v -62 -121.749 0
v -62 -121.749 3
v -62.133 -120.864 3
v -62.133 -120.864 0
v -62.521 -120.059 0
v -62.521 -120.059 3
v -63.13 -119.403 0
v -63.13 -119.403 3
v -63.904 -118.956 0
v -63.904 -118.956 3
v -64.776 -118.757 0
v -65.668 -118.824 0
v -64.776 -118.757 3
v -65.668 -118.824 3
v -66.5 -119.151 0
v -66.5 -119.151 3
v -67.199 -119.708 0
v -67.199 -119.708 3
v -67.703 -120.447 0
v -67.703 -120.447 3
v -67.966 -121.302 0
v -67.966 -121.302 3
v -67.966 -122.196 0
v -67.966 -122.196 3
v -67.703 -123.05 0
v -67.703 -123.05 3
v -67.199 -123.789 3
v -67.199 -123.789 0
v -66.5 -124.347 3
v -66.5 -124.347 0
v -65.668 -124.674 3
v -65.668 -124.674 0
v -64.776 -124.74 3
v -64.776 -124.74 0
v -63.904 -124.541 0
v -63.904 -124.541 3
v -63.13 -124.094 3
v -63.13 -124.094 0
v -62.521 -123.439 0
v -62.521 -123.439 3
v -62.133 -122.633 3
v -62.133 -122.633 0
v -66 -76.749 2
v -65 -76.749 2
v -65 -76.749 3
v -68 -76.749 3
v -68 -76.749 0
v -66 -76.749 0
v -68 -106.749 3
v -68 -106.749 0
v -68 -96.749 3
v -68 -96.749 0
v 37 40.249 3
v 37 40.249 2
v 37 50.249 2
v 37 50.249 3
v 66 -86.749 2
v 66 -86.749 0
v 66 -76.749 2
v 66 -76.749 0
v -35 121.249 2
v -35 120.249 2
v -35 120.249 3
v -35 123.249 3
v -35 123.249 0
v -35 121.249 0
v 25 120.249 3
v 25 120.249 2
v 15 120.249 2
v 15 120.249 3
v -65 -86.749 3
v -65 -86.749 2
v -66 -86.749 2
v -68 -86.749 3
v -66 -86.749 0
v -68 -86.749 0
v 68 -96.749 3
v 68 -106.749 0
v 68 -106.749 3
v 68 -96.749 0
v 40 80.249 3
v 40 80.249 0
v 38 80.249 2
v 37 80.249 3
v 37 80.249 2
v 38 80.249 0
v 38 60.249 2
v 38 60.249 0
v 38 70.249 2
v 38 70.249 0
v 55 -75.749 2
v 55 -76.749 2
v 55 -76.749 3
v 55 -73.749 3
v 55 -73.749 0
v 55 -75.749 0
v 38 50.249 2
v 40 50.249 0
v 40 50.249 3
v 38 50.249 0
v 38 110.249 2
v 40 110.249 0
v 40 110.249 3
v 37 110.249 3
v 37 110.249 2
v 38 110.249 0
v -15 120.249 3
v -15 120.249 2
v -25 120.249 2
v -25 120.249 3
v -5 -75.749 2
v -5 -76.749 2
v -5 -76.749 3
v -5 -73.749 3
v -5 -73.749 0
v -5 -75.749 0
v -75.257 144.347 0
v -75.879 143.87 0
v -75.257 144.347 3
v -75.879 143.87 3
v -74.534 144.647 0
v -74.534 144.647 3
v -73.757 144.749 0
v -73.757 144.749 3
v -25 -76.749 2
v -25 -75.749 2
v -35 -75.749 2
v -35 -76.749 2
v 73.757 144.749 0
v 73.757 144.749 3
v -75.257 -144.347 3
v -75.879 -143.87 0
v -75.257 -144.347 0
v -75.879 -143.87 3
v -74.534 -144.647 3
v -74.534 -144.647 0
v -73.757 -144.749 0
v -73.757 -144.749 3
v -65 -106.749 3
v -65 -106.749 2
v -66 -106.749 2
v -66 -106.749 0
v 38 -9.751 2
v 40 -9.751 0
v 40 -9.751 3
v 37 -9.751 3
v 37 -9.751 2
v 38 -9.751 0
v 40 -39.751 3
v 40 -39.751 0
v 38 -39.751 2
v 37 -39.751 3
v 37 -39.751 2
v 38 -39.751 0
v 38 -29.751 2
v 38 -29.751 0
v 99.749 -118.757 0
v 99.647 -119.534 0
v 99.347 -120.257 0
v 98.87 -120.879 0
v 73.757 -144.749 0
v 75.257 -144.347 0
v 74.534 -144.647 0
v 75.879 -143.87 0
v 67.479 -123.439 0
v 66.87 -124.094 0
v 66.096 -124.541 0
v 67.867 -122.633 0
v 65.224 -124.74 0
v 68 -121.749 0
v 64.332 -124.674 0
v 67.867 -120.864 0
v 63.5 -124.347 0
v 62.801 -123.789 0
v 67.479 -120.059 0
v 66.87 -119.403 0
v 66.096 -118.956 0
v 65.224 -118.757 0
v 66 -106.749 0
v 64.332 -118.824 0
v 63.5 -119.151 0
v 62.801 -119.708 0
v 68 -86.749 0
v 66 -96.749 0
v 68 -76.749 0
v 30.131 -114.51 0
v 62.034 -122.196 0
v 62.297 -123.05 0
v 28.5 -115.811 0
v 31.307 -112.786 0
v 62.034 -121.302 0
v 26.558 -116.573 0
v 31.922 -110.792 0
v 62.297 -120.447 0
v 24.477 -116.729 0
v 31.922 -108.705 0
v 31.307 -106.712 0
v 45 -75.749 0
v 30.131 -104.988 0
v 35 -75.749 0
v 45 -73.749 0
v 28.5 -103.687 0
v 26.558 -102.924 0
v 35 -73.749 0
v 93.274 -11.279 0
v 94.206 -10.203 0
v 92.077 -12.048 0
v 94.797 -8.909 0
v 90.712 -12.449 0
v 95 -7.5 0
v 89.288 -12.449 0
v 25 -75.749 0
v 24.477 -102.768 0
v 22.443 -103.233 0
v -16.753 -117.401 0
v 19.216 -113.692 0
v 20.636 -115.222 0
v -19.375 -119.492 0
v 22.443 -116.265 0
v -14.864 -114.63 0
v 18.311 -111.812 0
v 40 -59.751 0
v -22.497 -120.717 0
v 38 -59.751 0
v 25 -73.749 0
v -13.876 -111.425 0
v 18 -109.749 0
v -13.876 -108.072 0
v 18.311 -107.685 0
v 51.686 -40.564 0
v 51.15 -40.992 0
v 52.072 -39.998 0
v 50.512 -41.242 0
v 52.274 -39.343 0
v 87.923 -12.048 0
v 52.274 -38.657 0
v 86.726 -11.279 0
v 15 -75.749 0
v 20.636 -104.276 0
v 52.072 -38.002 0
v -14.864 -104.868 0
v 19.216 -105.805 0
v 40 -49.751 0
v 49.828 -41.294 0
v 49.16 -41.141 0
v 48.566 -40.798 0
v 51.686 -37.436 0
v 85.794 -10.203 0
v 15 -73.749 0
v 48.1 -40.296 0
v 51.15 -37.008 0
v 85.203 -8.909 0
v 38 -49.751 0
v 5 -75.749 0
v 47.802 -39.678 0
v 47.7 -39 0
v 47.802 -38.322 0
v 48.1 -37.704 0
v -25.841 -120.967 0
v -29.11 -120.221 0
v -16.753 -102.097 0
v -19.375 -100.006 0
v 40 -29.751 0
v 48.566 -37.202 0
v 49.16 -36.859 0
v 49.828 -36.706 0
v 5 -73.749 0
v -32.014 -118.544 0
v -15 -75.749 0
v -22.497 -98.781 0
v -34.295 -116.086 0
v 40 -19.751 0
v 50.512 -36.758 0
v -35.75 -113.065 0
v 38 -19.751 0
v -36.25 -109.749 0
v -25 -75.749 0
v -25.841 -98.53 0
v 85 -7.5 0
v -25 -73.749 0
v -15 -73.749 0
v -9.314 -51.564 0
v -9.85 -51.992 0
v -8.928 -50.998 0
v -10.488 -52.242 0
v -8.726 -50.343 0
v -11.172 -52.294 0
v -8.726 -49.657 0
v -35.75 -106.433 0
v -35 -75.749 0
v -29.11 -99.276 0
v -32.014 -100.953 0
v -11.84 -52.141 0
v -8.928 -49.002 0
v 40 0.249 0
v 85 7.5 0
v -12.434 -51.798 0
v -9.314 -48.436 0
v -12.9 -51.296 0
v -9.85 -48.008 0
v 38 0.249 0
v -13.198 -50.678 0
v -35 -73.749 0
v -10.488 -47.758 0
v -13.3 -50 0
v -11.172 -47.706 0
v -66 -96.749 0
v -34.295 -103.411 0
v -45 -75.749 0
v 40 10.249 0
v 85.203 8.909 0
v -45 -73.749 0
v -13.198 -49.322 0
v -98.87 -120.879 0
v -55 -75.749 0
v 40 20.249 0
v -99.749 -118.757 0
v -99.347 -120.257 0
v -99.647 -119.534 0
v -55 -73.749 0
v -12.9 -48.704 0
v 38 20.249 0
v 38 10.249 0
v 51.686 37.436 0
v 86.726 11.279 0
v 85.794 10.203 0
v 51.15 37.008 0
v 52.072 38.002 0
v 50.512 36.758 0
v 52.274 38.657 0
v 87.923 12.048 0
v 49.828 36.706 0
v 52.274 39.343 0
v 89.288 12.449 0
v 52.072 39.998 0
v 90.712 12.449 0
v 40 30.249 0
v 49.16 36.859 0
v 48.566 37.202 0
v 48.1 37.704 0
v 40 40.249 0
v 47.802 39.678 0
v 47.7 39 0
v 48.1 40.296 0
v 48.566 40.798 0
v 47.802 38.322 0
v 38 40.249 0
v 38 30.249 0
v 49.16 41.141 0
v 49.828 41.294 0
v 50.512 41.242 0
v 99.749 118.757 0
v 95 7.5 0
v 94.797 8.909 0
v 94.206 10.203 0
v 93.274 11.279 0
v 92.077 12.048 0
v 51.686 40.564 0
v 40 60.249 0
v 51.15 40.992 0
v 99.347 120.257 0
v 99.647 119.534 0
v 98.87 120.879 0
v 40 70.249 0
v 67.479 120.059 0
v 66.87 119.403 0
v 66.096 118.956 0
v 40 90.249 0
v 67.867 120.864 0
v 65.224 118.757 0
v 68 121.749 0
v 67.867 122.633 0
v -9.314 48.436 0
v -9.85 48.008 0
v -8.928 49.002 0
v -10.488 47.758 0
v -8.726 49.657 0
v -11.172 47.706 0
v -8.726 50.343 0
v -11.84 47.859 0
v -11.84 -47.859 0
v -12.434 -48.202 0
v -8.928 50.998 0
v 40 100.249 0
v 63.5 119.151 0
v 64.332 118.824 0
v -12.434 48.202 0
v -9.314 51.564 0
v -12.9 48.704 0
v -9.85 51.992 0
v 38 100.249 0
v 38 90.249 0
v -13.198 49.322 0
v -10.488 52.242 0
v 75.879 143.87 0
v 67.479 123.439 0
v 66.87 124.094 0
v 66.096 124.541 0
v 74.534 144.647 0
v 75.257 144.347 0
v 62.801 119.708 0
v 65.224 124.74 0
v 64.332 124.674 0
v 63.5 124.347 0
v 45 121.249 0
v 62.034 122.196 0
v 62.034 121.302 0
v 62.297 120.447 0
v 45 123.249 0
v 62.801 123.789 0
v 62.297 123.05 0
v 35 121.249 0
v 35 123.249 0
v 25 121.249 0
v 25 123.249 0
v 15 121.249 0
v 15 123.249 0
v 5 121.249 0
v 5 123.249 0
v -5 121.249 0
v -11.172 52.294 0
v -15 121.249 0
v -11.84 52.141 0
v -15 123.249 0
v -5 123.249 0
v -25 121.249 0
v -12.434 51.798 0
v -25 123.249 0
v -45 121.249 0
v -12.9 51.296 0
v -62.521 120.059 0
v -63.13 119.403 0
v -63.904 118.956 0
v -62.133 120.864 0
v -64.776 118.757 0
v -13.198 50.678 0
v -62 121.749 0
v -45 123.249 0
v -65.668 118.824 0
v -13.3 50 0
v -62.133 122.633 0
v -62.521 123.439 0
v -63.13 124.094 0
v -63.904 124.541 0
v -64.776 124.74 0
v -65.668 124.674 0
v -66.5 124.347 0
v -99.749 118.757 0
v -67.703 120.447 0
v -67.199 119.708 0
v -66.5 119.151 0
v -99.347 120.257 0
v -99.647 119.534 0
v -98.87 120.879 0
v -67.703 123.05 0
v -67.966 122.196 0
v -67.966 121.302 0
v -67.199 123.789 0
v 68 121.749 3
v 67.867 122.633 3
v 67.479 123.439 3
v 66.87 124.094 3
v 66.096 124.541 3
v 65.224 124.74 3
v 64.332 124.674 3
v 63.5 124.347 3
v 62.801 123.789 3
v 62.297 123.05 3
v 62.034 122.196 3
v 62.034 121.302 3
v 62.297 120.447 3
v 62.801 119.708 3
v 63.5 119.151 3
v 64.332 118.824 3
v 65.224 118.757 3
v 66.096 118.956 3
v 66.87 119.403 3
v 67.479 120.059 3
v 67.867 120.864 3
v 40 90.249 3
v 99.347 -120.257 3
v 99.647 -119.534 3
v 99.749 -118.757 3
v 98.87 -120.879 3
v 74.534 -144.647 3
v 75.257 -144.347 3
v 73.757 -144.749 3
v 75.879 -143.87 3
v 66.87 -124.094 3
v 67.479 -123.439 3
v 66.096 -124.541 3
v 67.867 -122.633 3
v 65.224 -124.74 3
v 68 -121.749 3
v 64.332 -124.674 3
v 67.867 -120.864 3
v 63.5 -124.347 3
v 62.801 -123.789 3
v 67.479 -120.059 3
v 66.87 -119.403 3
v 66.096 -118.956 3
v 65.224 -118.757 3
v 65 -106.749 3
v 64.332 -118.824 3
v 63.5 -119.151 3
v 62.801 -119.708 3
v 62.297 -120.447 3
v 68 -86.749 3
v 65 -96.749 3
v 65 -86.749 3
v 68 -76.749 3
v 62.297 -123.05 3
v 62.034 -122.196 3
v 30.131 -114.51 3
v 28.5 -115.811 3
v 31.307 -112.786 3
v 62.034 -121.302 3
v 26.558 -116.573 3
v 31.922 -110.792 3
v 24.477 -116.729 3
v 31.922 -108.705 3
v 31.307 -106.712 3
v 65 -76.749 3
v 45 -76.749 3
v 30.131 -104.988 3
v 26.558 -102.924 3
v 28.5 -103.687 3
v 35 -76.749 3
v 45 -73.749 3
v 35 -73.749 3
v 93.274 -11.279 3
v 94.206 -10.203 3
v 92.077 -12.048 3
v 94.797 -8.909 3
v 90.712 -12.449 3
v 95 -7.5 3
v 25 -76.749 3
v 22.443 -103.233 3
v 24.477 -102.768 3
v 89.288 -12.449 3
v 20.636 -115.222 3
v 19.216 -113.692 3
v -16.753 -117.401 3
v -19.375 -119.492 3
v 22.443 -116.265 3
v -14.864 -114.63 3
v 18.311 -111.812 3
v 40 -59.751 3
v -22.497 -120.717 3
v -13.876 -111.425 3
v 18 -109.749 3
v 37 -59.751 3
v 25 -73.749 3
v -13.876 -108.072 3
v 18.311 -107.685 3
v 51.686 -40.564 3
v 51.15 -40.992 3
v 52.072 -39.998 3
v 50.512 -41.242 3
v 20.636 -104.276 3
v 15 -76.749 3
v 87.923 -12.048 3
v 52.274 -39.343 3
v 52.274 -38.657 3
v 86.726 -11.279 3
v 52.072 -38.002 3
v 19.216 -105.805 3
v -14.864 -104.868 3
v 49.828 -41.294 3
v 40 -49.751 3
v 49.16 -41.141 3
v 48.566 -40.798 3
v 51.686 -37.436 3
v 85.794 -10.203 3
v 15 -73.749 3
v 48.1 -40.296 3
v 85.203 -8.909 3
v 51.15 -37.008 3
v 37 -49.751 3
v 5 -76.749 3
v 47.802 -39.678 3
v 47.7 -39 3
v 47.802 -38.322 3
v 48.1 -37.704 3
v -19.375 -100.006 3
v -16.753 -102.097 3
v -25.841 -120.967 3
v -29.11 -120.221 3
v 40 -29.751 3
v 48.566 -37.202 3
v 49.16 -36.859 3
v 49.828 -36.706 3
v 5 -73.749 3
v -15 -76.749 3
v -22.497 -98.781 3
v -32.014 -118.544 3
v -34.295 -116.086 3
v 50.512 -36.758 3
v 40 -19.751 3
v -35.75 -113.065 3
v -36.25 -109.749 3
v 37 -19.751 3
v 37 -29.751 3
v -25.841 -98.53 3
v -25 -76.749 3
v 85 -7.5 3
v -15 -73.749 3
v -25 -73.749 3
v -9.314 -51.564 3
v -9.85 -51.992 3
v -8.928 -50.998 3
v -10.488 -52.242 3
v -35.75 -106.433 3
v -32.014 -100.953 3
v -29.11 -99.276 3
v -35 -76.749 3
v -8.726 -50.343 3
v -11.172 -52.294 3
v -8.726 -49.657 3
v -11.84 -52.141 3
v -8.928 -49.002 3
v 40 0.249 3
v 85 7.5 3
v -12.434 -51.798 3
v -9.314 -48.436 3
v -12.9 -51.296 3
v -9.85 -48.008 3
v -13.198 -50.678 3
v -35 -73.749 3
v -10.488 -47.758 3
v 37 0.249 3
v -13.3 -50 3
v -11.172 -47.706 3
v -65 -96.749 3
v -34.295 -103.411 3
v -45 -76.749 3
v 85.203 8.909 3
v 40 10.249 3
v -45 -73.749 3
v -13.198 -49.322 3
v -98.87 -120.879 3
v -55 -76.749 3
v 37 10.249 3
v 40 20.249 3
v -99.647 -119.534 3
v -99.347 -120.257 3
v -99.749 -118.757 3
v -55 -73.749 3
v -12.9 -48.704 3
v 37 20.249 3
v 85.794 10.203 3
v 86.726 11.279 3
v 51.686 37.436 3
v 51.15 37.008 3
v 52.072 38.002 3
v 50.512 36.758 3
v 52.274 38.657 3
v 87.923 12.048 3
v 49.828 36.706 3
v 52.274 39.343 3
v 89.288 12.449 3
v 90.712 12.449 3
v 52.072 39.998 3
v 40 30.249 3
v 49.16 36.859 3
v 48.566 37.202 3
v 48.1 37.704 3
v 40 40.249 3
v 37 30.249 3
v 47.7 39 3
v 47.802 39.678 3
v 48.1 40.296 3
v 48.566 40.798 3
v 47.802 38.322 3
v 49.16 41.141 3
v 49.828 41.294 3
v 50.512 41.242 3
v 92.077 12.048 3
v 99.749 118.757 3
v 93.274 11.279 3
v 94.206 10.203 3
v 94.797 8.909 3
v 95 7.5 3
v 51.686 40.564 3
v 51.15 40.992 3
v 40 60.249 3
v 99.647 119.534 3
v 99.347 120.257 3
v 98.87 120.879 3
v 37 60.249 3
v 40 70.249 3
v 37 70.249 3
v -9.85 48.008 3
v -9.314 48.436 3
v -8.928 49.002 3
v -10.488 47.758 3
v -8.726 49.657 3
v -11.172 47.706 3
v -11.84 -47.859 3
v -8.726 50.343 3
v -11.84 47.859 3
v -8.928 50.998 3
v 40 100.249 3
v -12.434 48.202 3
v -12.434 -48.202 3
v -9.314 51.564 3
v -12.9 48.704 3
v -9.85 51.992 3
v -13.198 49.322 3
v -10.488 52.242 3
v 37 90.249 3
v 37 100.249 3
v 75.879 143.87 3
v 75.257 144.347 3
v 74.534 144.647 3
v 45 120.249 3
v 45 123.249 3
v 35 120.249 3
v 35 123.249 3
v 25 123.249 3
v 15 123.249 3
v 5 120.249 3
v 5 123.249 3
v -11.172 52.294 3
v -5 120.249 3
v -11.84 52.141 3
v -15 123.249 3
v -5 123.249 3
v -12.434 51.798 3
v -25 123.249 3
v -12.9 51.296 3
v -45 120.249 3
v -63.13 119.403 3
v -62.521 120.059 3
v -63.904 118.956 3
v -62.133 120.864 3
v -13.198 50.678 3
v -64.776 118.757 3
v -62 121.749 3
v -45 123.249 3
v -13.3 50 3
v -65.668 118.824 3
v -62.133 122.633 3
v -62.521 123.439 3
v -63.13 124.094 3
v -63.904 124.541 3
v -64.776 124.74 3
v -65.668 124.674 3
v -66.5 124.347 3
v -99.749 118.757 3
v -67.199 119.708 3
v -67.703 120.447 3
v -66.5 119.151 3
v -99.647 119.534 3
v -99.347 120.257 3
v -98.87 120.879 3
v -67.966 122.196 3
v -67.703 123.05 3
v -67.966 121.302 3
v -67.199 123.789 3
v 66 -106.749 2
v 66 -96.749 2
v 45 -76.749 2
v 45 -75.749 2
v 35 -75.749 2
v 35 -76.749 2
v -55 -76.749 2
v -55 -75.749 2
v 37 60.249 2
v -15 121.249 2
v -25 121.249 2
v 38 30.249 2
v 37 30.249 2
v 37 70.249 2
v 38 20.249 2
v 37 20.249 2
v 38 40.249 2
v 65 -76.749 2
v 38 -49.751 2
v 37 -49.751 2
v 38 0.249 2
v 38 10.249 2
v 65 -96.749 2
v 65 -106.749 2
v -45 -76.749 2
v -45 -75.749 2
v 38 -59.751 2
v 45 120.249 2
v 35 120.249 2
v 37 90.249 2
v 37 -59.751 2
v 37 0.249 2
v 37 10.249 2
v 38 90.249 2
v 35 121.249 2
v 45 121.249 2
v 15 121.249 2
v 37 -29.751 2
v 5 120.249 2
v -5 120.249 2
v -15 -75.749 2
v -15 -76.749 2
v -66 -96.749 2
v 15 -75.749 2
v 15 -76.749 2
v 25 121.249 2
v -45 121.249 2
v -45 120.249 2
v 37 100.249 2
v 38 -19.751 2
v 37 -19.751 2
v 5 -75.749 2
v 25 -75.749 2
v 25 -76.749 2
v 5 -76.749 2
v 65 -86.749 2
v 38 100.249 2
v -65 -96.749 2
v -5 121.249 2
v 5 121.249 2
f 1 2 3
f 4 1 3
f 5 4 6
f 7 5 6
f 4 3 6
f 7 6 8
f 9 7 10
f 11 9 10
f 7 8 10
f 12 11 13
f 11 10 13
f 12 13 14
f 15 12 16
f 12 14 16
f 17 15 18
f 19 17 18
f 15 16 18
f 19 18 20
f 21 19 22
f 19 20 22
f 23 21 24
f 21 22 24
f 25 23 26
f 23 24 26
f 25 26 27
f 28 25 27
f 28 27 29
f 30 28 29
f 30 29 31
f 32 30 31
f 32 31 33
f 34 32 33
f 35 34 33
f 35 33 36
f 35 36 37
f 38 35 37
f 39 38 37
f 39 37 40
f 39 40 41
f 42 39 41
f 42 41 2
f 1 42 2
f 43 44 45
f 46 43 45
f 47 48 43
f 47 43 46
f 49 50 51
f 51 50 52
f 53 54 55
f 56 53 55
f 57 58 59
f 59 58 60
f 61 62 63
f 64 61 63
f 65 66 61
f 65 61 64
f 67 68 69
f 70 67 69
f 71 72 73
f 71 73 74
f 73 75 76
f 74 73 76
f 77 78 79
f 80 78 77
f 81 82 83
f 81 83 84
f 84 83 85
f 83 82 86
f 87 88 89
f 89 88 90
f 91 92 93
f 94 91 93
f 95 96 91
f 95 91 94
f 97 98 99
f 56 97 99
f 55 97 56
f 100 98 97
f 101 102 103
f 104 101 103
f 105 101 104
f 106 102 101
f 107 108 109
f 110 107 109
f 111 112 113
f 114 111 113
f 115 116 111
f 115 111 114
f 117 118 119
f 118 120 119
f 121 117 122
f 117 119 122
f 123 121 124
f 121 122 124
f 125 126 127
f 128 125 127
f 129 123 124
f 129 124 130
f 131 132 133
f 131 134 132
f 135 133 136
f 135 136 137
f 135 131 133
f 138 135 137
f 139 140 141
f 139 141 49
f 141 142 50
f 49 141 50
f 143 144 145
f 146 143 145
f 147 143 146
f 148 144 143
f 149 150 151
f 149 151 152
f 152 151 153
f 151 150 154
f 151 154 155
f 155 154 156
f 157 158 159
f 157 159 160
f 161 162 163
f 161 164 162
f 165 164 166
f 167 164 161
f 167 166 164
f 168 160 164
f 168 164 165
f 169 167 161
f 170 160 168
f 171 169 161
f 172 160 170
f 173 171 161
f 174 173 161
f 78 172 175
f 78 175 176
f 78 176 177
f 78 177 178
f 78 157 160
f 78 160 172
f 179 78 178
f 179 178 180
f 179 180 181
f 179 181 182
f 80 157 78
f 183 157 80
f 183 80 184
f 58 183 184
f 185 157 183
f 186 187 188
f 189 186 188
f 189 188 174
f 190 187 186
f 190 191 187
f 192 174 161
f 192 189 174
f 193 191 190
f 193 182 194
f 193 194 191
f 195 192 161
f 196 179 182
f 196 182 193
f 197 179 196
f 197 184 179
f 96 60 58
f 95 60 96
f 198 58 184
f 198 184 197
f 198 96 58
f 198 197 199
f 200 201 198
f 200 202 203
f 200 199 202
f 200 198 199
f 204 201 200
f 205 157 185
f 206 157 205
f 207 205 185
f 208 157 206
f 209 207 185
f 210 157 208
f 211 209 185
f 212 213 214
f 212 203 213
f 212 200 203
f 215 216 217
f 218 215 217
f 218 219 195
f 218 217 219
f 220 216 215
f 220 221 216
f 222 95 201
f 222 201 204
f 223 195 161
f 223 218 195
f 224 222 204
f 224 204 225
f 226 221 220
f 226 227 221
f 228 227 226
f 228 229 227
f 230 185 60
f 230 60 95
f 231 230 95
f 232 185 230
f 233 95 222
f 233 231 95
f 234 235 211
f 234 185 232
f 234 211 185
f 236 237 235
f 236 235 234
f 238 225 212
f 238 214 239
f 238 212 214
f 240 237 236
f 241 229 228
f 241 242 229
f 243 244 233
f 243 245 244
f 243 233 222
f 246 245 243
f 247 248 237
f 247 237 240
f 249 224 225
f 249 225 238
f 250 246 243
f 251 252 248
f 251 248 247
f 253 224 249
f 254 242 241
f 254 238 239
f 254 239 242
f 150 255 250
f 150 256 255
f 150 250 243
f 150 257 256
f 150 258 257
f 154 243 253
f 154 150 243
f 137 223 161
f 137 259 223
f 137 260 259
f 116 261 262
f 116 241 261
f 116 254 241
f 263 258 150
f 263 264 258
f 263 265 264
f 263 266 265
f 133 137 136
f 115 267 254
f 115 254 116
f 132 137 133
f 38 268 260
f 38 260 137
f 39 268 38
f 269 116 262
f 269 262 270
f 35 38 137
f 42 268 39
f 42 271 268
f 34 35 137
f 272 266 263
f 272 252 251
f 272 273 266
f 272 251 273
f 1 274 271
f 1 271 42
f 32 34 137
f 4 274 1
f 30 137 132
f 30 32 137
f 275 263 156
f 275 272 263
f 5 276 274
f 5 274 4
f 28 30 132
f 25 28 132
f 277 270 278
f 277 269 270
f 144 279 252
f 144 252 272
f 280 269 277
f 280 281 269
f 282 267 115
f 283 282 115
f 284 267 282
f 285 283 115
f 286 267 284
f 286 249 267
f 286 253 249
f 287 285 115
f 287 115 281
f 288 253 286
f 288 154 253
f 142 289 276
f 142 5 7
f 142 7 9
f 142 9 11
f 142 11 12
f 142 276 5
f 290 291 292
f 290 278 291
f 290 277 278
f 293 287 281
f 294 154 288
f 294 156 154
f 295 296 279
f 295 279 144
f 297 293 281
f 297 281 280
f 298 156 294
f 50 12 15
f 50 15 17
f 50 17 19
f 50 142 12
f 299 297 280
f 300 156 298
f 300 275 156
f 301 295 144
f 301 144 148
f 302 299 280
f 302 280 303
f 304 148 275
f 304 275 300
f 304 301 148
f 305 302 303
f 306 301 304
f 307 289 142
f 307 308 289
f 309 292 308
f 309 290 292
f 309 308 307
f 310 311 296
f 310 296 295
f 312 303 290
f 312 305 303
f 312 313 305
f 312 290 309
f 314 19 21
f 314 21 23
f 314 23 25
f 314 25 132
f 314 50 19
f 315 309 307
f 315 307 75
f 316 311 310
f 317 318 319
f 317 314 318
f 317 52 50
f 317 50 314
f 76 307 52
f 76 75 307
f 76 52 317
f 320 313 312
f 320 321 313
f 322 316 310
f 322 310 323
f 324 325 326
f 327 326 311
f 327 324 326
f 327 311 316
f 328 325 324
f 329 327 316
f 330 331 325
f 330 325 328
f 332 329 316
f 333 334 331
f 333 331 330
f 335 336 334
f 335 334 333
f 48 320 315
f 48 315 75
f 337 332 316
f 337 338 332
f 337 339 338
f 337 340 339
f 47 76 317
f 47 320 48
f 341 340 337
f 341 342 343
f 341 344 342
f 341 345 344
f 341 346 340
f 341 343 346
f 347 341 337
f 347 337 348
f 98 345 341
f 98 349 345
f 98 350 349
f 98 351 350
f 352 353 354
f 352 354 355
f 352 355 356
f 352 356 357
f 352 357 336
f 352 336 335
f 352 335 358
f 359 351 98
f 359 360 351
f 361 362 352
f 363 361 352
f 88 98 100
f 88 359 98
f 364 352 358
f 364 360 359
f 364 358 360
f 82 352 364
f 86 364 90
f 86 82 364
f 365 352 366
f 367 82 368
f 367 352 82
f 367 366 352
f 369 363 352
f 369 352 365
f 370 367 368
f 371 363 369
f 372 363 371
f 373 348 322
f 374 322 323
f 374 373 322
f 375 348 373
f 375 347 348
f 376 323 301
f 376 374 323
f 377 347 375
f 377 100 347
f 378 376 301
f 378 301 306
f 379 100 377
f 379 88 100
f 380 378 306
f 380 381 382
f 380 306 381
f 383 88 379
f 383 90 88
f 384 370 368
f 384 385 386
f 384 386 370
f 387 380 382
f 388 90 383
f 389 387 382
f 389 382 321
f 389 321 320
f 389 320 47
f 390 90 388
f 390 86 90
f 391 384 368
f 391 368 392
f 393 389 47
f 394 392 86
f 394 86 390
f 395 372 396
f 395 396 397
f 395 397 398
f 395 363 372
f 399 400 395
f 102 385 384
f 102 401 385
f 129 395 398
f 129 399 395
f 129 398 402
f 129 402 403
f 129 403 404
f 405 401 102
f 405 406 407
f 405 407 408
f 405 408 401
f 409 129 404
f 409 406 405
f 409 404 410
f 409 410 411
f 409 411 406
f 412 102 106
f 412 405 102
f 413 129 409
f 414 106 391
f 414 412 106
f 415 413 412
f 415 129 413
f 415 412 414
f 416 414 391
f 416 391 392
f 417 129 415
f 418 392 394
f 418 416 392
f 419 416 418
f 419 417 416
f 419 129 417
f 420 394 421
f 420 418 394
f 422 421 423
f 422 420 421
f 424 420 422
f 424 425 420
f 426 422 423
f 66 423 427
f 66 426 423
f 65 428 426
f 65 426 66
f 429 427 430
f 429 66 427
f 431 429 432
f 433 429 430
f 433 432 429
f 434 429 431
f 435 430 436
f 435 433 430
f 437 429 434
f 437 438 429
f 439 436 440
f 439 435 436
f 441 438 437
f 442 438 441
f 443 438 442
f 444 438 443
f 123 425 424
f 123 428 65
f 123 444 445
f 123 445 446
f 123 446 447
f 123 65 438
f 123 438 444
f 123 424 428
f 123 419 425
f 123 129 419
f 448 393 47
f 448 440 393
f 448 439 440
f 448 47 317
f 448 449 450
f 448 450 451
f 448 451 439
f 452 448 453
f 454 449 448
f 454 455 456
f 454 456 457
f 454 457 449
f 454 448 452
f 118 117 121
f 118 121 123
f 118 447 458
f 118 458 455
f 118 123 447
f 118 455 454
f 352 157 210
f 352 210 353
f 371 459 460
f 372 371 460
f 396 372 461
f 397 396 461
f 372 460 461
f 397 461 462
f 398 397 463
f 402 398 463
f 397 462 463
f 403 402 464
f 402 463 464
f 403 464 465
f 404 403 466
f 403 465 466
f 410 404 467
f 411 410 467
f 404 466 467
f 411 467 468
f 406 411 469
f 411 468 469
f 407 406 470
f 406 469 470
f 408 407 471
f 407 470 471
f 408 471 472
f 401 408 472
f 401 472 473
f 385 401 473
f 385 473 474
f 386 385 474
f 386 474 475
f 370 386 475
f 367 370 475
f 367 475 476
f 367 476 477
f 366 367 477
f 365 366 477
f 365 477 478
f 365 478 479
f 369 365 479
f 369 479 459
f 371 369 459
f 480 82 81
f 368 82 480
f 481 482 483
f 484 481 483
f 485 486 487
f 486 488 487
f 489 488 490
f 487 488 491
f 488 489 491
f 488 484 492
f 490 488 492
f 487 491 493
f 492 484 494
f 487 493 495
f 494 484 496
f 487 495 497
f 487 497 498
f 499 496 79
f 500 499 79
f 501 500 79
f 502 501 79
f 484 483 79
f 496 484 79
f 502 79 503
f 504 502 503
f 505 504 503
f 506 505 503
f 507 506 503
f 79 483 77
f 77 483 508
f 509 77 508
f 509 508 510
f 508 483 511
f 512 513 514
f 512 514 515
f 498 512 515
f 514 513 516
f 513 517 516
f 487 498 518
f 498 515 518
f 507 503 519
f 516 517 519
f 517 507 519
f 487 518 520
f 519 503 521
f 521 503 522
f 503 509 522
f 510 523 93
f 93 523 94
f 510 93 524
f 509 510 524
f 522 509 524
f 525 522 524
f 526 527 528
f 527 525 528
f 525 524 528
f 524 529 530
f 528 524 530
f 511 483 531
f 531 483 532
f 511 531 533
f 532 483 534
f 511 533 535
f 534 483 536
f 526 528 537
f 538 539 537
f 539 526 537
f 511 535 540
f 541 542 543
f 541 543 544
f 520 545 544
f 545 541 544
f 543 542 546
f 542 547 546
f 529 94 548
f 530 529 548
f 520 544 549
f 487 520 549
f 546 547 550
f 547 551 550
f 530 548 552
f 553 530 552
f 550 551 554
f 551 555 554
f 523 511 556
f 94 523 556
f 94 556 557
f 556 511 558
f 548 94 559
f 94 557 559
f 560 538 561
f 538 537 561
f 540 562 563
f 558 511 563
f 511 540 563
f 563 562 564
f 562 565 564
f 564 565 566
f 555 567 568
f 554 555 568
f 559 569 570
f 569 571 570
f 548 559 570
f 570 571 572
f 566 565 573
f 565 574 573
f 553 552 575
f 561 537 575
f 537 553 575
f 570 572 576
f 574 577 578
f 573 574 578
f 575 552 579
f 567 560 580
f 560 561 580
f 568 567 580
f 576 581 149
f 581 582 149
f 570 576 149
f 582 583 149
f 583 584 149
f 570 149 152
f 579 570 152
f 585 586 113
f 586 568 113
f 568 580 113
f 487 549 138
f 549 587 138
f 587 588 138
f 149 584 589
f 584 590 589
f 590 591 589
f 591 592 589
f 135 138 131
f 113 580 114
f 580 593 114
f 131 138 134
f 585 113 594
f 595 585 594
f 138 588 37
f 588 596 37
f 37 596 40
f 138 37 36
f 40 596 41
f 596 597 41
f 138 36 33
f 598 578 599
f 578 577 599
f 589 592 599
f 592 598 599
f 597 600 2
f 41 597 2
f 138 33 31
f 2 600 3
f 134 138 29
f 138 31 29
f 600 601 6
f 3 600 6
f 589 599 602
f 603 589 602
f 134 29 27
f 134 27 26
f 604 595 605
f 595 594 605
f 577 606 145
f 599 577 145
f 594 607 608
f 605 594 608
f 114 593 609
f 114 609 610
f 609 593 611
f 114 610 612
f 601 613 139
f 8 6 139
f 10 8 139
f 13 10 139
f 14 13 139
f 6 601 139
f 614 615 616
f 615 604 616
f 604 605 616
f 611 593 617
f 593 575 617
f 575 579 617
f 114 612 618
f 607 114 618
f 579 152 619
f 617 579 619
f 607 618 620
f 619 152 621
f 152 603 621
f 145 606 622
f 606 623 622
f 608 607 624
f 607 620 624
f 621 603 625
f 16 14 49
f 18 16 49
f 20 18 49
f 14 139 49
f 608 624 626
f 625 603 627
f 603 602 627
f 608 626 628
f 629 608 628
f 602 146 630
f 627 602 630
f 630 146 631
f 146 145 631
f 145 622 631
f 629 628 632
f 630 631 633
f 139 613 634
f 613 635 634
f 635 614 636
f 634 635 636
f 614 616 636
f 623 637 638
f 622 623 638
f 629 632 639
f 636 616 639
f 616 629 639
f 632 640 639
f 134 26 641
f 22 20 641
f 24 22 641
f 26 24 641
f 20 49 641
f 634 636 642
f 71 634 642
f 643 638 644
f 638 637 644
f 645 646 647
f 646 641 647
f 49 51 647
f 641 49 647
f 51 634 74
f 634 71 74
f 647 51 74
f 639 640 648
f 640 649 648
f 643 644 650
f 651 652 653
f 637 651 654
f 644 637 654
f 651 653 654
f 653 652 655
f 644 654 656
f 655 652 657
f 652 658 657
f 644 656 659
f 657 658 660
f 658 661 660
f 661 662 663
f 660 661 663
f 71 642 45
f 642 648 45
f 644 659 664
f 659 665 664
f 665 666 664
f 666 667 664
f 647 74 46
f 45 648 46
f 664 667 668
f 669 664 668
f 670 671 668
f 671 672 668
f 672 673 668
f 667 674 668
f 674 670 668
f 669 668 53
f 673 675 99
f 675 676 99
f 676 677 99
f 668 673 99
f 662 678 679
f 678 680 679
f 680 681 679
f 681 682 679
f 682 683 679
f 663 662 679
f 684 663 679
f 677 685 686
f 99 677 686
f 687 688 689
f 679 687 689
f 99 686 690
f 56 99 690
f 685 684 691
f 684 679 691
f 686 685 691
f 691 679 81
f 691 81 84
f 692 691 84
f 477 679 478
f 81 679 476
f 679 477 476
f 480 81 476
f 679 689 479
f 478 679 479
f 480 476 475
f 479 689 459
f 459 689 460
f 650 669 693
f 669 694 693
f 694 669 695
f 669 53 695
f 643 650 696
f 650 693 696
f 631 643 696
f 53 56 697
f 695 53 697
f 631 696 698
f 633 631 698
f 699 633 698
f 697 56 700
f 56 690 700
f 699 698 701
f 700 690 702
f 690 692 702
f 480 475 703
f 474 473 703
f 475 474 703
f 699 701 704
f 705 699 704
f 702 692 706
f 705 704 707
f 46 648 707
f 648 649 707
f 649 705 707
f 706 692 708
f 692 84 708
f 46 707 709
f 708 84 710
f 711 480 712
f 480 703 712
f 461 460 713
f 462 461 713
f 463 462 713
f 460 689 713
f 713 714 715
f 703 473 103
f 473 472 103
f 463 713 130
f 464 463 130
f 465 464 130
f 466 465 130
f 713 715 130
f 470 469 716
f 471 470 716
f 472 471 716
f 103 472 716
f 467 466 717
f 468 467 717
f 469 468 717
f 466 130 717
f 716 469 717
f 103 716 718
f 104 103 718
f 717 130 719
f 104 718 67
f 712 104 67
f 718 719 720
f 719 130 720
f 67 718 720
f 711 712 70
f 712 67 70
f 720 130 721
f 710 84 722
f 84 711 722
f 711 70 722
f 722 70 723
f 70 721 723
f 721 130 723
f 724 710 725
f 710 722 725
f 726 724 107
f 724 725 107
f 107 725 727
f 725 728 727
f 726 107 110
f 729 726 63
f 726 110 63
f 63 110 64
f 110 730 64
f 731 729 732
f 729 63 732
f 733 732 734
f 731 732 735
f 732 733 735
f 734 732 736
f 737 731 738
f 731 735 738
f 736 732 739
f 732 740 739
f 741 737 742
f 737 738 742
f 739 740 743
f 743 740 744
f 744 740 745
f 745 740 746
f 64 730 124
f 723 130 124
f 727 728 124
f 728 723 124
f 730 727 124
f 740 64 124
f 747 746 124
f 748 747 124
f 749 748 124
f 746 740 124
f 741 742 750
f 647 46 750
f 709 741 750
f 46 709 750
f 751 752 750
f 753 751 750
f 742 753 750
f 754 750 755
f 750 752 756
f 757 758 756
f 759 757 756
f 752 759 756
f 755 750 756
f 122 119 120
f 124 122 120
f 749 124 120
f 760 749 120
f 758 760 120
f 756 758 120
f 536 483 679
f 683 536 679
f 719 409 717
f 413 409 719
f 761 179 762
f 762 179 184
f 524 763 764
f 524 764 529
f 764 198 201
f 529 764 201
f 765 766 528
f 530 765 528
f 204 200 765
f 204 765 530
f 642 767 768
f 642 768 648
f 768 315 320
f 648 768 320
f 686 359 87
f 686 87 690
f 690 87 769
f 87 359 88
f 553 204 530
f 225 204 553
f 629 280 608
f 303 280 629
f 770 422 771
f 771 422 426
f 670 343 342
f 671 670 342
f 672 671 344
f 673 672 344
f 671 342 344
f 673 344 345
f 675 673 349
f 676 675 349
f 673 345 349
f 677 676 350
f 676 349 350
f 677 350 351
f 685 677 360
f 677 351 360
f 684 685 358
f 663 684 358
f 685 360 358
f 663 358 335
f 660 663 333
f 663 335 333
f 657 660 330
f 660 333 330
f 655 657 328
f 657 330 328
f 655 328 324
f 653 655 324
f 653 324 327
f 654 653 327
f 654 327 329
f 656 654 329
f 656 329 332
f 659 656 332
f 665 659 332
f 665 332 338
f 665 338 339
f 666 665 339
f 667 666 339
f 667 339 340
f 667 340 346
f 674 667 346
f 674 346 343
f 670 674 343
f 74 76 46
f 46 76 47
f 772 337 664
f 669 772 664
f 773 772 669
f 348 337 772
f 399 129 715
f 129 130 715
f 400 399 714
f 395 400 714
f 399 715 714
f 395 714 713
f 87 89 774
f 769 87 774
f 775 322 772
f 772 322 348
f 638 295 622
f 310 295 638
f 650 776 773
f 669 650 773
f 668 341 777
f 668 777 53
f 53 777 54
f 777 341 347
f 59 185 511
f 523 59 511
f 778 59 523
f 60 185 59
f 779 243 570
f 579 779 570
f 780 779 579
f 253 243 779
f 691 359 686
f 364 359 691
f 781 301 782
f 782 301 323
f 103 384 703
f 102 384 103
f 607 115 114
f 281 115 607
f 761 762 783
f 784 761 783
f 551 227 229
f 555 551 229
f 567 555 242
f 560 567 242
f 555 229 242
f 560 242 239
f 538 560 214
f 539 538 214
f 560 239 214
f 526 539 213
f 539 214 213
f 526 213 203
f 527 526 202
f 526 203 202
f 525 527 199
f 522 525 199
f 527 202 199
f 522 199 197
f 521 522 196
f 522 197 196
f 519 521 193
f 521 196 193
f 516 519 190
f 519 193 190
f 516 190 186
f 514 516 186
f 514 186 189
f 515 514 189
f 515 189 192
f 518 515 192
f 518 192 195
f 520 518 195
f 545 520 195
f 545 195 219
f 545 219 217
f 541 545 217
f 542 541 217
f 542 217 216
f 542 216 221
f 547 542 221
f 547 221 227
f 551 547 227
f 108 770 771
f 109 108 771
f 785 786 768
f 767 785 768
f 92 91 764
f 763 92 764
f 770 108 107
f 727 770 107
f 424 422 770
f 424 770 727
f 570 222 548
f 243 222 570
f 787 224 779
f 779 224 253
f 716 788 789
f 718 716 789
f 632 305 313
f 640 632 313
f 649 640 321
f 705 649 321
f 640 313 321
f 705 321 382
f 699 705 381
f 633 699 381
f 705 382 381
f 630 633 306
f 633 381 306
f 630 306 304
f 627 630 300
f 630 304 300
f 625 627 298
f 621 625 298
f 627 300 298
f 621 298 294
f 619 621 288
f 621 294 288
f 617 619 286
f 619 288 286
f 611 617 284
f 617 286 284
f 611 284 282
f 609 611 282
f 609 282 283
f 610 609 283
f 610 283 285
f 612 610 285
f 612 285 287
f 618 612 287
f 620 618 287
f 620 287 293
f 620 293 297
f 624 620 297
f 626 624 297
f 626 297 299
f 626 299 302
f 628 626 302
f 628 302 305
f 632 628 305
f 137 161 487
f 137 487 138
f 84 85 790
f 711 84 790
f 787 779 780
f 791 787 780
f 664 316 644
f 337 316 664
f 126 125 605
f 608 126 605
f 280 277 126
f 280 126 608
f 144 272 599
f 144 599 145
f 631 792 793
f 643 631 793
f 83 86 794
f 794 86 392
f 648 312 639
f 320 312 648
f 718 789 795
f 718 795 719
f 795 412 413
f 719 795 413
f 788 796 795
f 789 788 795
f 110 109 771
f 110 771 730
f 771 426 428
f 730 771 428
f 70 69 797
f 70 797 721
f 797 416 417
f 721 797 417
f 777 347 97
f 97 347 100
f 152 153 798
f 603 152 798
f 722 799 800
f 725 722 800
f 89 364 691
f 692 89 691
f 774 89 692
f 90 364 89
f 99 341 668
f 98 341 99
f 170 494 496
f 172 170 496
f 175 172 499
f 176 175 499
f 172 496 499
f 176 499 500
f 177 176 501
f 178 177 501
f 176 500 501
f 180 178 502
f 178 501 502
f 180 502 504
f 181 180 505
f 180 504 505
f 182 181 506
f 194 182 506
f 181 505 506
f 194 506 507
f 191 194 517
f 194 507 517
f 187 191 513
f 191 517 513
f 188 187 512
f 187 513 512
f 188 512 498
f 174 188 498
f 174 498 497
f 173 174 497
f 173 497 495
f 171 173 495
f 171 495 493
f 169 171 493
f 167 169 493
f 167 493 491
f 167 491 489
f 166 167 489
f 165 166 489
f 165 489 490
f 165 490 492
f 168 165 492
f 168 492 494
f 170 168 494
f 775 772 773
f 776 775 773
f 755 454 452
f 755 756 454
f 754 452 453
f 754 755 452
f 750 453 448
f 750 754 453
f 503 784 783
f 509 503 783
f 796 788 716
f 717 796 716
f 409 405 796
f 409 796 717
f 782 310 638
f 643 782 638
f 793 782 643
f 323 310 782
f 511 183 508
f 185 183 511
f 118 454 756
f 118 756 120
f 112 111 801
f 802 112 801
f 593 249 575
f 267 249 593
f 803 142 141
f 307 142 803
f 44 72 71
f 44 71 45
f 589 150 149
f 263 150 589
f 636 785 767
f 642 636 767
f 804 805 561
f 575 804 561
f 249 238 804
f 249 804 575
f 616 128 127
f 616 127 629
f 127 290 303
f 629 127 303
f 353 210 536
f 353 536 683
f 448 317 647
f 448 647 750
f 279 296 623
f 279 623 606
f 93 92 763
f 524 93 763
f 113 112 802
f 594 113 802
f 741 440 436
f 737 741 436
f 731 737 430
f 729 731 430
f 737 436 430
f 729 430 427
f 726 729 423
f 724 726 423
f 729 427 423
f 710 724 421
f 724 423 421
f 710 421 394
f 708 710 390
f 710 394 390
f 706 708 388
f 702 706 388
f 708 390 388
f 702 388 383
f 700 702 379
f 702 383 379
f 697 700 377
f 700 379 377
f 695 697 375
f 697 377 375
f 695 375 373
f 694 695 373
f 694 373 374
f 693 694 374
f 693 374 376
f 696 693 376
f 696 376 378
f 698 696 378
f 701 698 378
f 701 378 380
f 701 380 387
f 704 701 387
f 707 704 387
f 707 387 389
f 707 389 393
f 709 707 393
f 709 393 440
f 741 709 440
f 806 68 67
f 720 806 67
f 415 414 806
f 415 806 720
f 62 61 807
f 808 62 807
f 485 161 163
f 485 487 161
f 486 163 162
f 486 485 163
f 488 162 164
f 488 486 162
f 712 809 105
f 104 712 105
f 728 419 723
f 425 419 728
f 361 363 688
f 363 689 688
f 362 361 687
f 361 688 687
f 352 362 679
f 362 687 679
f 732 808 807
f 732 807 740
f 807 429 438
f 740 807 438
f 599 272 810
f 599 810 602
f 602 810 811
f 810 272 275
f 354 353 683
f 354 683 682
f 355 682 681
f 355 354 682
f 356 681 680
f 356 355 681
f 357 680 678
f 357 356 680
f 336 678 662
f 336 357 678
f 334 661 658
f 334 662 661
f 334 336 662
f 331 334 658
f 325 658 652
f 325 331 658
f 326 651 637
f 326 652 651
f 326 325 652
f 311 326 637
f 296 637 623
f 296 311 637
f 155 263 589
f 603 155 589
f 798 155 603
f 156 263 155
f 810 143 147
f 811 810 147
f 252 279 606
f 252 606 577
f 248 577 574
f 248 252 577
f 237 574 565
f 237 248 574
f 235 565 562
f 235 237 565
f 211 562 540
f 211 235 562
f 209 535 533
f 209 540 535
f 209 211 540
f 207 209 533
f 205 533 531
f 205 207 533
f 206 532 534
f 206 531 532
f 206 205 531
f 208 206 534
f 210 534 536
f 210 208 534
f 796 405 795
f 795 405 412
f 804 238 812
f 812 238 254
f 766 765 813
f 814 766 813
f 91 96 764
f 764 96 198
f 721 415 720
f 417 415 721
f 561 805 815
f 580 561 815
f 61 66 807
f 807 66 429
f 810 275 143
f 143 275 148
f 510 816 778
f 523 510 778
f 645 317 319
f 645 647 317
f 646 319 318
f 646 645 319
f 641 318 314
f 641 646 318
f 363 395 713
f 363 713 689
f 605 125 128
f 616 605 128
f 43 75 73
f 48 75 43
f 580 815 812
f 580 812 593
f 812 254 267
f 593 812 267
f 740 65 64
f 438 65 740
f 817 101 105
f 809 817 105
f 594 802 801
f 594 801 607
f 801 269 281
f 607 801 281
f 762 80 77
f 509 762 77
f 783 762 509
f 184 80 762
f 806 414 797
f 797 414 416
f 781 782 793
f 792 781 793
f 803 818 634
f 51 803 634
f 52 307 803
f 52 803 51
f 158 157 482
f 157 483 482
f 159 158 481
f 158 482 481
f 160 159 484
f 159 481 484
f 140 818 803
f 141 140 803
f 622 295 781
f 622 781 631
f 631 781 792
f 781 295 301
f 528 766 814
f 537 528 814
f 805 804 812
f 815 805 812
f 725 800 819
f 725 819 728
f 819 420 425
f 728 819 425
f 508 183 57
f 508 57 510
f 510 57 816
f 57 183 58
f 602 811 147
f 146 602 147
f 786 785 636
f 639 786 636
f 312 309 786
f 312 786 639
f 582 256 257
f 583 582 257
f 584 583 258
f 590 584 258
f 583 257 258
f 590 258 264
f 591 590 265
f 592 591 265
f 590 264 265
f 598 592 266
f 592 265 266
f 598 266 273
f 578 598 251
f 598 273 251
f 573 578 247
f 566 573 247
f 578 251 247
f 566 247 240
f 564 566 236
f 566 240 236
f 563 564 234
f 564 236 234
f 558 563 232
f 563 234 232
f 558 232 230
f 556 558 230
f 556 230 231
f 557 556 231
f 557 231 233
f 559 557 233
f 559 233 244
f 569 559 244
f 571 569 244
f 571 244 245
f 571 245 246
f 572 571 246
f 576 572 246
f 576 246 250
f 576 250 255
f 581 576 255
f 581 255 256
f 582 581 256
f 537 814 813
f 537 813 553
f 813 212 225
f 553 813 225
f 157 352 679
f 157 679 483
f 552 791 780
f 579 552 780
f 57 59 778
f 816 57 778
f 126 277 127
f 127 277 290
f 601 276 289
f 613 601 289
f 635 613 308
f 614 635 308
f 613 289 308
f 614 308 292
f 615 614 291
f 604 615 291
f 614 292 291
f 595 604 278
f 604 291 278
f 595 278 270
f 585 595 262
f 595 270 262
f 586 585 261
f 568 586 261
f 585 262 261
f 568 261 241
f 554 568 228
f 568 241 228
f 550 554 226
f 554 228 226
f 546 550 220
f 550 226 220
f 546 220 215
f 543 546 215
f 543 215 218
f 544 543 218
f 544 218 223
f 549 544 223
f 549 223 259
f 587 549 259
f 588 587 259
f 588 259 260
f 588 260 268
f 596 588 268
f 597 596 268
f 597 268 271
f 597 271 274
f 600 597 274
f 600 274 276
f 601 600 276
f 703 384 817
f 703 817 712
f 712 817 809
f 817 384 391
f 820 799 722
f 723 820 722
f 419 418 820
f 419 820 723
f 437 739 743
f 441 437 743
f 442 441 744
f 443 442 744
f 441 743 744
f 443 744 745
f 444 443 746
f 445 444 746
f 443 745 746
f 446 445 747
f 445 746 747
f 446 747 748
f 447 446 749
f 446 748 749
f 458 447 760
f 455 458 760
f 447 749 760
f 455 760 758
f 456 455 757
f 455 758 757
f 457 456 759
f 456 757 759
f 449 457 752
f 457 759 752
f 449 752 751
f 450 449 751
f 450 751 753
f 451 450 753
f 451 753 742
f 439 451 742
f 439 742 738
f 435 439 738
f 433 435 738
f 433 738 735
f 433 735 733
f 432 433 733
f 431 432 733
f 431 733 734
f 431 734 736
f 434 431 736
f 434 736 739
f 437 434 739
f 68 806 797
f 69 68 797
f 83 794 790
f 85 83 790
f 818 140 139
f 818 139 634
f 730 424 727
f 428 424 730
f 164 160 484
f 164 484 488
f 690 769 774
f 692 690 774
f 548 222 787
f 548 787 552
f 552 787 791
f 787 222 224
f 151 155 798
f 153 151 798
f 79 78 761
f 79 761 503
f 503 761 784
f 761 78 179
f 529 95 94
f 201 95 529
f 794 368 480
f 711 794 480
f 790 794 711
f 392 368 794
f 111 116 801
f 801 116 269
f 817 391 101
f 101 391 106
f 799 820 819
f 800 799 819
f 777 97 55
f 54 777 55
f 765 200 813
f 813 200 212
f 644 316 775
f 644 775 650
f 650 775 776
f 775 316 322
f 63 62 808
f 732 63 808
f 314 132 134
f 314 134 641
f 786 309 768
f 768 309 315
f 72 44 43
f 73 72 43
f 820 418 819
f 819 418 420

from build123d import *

# Parameters (mm, degrees)
BASE_DEPTH                             = 3
ESQUISSE2_R                            = 3
PER_AGE_PROFIL_DEPTH                   = 5
ESQUISSE3_R                            = 2.3
PER_AGE_LIDAR_DEPTH                    = 4
ESQUISSE4_R                            = 11.25
PER_AGE_BOUTON_D_ARRET_D_URGENCE_DEPTH = 4
ESQUISSE5_R                            = 7
PER_AGE_TIRETTE_DEPTH                  = 4
PER_AGE_CABLE_MANAGEMENT_DEPTH         = 4
SKETCH1_W                              = 10
SKETCH1_H                              = 3
SKETCH1_W_2                            = 3
SKETCH1_H_2                            = 10
CUT_EXTRUDE1_DEPTH                     = 4
CONG_1_R                               = 3
ESQUISSE10_W                           = 90
ESQUISSE10_H                           = 1
ESQUISSE10_W_2                         = 1
ESQUISSE10_H_2                         = 170
ESQUISSE10_W_3                         = 110
ESQUISSE10_H_3                         = 30
BOSS_EXTRU_1_DEPTH                     = 2


with BuildPart() as part:
    # Esquisse1 → Base (new body)
    with BuildSketch(Plane.XY):
        Polygon((-99.748737342, 120), (-75, 144.748737342), (75, 144.748737342), (99.748737342, 120), (99.748737342, -120), (75, -144.748737342), (-75, -144.748737342), (-99.748737342, -120), align=None)
    extrude(amount=BASE_DEPTH)

    # Esquisse2 → Perçage profilé (cut)
    with BuildSketch(Plane.XY.offset(3)):
        with Locations((-65, 121.748737342)):
            Circle(ESQUISSE2_R)
        with Locations((65, 121.748737342)):
            Circle(ESQUISSE2_R)
        with Locations((65, -121.748737342)):
            Circle(ESQUISSE2_R)
        with Locations((-65, -121.748737342)):
            Circle(ESQUISSE2_R)
    extrude(amount=-PER_AGE_PROFIL_DEPTH, mode=Mode.SUBTRACT)

    # Esquisse3 → Perçage Lidar (cut, through all)
    with BuildSketch(Plane(origin=(0, 0, 0), x_dir=(-1, 0, 0), z_dir=(0, 0, -1))):
        with Locations((-50, 39)):
            Circle(ESQUISSE3_R)
        with Locations((11, 50)):
            Circle(ESQUISSE3_R)
        with Locations((-50, -39)):
            Circle(ESQUISSE3_R)
        with Locations((11, -50)):
            Circle(ESQUISSE3_R)
    extrude(amount=-PER_AGE_LIDAR_DEPTH, mode=Mode.SUBTRACT)

    # Esquisse4 → Perçage bouton d'arret d'urgence (cut, through all)
    with BuildSketch(Plane(origin=(0, 0, 0), x_dir=(-1, 0, 0), z_dir=(0, 0, -1))):
        with Locations((25, -109.748737342)):
            Circle(ESQUISSE4_R)
    extrude(amount=-PER_AGE_BOUTON_D_ARRET_D_URGENCE_DEPTH, mode=Mode.SUBTRACT)

    # Esquisse5 → Perçage tirette (cut, through all)
    with BuildSketch(Plane(origin=(0, 0, 0), x_dir=(-1, 0, 0), z_dir=(0, 0, -1))):
        with Locations((-25, -109.748737342)):
            Circle(ESQUISSE5_R)
    extrude(amount=-PER_AGE_TIRETTE_DEPTH, mode=Mode.SUBTRACT)

    # Esquisse7 → Perçage cable management (cut, through all)
    with BuildSketch(Plane(origin=(0, 0, 0), x_dir=(-1, 0, 0), z_dir=(0, 0, -1))):
        with BuildLine():
            Line((-85, 7.5), (-85, -7.5))
            ThreePointArc((-85, -7.5), (-90, -12.5), (-95, -7.5))
            Line((-95, -7.5), (-95, 7.5))
            ThreePointArc((-95, 7.5), (-90, 12.5), (-85, 7.5))
        make_face()
    extrude(amount=-PER_AGE_CABLE_MANAGEMENT_DEPTH, mode=Mode.SUBTRACT)

    # Sketch1 → Cut-Extrude1 (cut, through all)
    with BuildSketch(Plane(origin=(0, 0, 0), x_dir=(-1, 0, 0), z_dir=(0, 0, -1))):
        with Locations((-40, 121.748737342)):
            Rectangle(SKETCH1_W, SKETCH1_H)
        with Locations((-20, 121.748737342)):
            Rectangle(SKETCH1_W, SKETCH1_H)
        with Locations((0, 121.748737342)):
            Rectangle(SKETCH1_W, SKETCH1_H)
        with Locations((20, 121.748737342)):
            Rectangle(SKETCH1_W, SKETCH1_H)
        with Locations((40, 121.748737342)):
            Rectangle(SKETCH1_W, SKETCH1_H)
        with Locations((-66.5, -101.748737342)):
            Rectangle(SKETCH1_W_2, SKETCH1_H_2)
        with Locations((-38.5, 85.248737342)):
            Rectangle(SKETCH1_W_2, SKETCH1_H_2)
        with Locations((-38.5, 105.248737342)):
            Rectangle(SKETCH1_W_2, SKETCH1_H_2)
        with Locations((-66.5, -81.748737342)):
            Rectangle(SKETCH1_W_2, SKETCH1_H_2)
        with Locations((66.5, -81.748737342)):
            Rectangle(SKETCH1_W_2, SKETCH1_H_2)
        with Locations((66.5, -101.748737342)):
            Rectangle(SKETCH1_W_2, SKETCH1_H_2)
        with Locations((-30, -75.248737342)):
            Rectangle(SKETCH1_W, SKETCH1_H)
        with Locations((-50, -75.248737342)):
            Rectangle(SKETCH1_W, SKETCH1_H)
        with Locations((-10, -75.248737342)):
            Rectangle(SKETCH1_W, SKETCH1_H)
        with Locations((10, -75.248737342)):
            Rectangle(SKETCH1_W, SKETCH1_H)
        with Locations((30, -75.248737342)):
            Rectangle(SKETCH1_W, SKETCH1_H)
        with Locations((50, -75.248737342)):
            Rectangle(SKETCH1_W, SKETCH1_H)
        with Locations((-38.5, 65.248737342)):
            Rectangle(SKETCH1_W_2, SKETCH1_H_2)
        with Locations((-38.5, 45.248737342)):
            Rectangle(SKETCH1_W_2, SKETCH1_H_2)
        with Locations((-38.5, 25.248737342)):
            Rectangle(SKETCH1_W_2, SKETCH1_H_2)
        with Locations((-38.5, 5.248737342)):
            Rectangle(SKETCH1_W_2, SKETCH1_H_2)
        with Locations((-38.5, -14.751262658)):
            Rectangle(SKETCH1_W_2, SKETCH1_H_2)
        with Locations((-38.5, -34.751262658)):
            Rectangle(SKETCH1_W_2, SKETCH1_H_2)
        with Locations((-38.5, -54.751262658)):
            Rectangle(SKETCH1_W_2, SKETCH1_H_2)
    extrude(amount=-CUT_EXTRUDE1_DEPTH, mode=Mode.SUBTRACT)

    # Congé1
    cong_1_edges = [part.edges().sort_by_distance(p)[0] for p in [
        (-99.748737342, 120, 1.5),
        (-75, 144.748737342, 1.5),
        (75, 144.748737342, 1.5),
        (99.748737342, 120, 1.5),
        (99.748737342, -120, 1.5),
        (75, -144.748737342, 1.5),
        (-75, -144.748737342, 1.5),
        (-99.748737342, -120, 1.5),
    ]]
    fillet(cong_1_edges, radius=CONG_1_R)

    # Esquisse10 → Boss.-Extru.1 (add)
    with BuildSketch(Plane(origin=(0, 0, 0), x_dir=(-1, 0, 0), z_dir=(0, 0, -1))):
        with Locations((0, 120.748737342)):
            Rectangle(ESQUISSE10_W, ESQUISSE10_H)
        with Locations((-37.5, 25.248737342)):
            Rectangle(ESQUISSE10_W_2, ESQUISSE10_H_2)
        with Locations((0, -76.248737342)):
            Rectangle(ESQUISSE10_W_3, ESQUISSE10_H)
        with Locations((65.5, -91.748737342)):
            Rectangle(ESQUISSE10_W_2, ESQUISSE10_H_3)
        with Locations((-65.5, -91.748737342)):
            Rectangle(ESQUISSE10_W_2, ESQUISSE10_H_3)
    extrude(amount=-BOSS_EXTRU_1_DEPTH)


solid = part.part
